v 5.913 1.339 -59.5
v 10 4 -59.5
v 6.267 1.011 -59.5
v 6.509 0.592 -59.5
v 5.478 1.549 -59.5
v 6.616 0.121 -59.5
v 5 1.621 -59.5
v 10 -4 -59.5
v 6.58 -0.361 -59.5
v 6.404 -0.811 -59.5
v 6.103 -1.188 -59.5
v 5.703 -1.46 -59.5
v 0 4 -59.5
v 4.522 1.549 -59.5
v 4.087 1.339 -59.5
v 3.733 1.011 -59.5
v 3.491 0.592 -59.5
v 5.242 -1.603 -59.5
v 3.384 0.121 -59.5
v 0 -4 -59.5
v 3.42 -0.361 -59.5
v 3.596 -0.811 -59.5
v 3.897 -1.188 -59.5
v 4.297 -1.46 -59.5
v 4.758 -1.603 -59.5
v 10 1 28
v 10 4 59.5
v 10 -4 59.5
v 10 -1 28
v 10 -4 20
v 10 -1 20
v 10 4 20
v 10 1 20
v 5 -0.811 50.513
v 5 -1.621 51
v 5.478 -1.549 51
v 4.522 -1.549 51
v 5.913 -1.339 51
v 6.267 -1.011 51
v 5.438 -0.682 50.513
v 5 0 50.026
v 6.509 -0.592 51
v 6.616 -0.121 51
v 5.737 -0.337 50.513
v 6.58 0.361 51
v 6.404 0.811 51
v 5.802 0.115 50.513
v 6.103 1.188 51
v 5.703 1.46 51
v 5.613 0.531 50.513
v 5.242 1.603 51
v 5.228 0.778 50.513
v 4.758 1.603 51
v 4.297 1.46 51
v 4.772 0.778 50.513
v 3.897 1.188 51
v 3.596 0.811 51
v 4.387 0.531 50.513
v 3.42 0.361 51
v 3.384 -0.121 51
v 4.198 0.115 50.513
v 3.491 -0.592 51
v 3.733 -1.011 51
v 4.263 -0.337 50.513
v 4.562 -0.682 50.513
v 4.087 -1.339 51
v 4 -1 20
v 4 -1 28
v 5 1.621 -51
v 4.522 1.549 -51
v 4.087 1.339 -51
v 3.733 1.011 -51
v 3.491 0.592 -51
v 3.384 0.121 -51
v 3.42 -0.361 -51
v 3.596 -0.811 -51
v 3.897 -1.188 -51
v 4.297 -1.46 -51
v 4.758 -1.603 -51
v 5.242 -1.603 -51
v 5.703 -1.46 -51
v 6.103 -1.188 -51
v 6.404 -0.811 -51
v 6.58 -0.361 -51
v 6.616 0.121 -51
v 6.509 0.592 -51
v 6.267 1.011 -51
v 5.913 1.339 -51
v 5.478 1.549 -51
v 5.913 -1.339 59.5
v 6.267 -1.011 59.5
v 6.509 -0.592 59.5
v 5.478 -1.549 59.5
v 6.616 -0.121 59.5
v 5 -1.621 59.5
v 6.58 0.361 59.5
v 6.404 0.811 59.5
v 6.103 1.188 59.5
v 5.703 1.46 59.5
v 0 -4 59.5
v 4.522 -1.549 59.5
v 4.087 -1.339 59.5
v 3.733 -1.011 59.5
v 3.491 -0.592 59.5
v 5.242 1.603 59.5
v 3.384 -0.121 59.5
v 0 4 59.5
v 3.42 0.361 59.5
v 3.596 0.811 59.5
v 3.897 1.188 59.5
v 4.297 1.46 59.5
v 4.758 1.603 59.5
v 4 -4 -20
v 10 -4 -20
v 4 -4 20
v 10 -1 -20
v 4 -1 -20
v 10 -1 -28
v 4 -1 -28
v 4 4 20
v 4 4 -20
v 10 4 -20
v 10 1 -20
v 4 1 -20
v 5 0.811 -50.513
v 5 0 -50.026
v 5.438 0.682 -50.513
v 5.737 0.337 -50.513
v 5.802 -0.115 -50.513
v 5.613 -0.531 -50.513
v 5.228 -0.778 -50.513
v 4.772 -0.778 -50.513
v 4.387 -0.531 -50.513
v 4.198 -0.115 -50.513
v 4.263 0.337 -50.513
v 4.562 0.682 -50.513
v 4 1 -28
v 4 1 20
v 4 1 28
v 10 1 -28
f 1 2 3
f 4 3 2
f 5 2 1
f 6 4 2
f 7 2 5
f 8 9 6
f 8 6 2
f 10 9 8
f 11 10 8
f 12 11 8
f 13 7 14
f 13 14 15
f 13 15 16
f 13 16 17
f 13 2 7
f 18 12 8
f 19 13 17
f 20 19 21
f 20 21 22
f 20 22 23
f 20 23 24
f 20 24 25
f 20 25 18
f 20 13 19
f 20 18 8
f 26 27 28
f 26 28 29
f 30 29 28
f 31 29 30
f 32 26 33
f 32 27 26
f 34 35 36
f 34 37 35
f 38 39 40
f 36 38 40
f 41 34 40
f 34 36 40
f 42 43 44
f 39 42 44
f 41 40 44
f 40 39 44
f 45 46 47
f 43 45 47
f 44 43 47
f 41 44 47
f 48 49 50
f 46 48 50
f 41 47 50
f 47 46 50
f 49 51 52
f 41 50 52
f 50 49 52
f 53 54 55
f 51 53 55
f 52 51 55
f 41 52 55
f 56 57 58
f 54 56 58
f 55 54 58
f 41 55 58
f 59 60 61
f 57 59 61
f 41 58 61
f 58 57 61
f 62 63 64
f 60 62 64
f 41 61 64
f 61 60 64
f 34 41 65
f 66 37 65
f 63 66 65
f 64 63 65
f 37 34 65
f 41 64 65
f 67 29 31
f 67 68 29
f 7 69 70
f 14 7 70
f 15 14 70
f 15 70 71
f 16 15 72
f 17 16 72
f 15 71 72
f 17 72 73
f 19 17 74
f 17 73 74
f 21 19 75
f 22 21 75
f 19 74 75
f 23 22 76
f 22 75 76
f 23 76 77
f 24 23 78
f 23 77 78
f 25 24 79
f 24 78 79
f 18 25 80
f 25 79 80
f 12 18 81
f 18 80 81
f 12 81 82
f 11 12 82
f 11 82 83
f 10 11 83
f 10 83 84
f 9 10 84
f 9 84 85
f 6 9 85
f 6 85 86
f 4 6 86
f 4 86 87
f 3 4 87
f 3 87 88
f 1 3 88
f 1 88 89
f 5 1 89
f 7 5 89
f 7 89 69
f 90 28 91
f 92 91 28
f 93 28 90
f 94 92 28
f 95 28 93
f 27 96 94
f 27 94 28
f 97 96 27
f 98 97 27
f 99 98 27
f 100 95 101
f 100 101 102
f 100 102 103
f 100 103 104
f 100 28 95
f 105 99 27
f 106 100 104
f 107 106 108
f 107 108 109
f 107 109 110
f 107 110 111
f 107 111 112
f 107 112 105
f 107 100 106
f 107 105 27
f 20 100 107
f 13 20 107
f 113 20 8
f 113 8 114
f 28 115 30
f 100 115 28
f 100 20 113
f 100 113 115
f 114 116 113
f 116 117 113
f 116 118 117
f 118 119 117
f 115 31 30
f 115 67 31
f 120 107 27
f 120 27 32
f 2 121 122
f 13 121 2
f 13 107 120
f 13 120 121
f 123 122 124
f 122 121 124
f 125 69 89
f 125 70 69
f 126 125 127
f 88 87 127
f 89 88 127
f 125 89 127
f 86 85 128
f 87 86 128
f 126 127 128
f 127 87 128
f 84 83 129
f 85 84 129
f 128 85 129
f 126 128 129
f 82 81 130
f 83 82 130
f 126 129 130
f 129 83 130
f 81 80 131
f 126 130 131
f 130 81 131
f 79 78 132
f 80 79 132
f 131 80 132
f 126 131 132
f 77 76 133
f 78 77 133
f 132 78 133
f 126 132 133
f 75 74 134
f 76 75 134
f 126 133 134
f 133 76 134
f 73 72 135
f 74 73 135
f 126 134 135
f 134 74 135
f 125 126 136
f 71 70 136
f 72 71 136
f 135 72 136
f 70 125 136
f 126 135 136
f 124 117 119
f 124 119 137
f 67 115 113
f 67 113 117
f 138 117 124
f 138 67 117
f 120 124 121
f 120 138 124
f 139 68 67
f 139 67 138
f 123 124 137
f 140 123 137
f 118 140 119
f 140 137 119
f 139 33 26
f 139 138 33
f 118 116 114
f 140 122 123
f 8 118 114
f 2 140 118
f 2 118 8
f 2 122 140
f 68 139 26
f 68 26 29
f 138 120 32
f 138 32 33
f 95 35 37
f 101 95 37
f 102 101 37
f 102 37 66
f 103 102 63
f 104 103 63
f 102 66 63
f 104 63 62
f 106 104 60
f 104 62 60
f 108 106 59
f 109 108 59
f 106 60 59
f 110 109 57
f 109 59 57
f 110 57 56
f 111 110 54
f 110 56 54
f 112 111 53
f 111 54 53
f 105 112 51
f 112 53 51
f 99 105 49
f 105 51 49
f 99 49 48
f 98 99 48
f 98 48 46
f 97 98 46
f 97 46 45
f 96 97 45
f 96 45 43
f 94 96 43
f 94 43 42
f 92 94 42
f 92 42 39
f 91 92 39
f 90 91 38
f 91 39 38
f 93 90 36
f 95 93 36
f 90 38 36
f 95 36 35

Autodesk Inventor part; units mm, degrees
ref_plane "YZ Plane" through (0, 0, 0) normal (1, 0, 0) x (0, 1, 0)
ref_plane "XZ Plane" through (0, 0, 0) normal (0, 1, 0) x (-1, 0, 0)
ref_plane "XY Plane" through (0, 0, 0) normal (0, 0, 1) x (1, 0, 0)
sketch "Sketch3" plane through (0, 0, 0) normal (1, 0, 0) x (0, 1, 0)
  line L0 (-4, 59.5) -> (4, 59.5)
  line L1 (4, 59.5) -> (4, -59.5)
  line L2 (4, -59.5) -> (-4, -59.5)
  line L3 (-4, -59.5) -> (-4, 59.5)
  line L4 (-67.3512, -62.0209) -> (6.0524, -62.0209) projected
  line L5 (-86.0704, 69.3717) -> (-9.6617, 69.3717)
  line L6 (-9.4707, -54.67) -> (-85.8794, -54.67)
  point P0 (0, 0)
  dimension "d7" = 119
  dimension "d8" = 59.5
  dimension "d9" = 8
  dimension "d10" = 4
  dimension "d50" = 124.0417
extrude "Extrusion1" add sketch "Sketch3" along normal blind 4
sketch "Sketch4" plane through (4, 0, 0) normal (1, 0, 0) x (0, 0, -1)
  line L0 (-59.5, 4) -> (59.5, 4) projected
  line L1 (-59.5, -4) -> (-59.5, 4) projected
  line L2 (59.5, -4) -> (-59.5, -4) projected
  line L3 (59.5, 4) -> (59.5, -4) projected
  line L4 (-59.5, 4) -> (-20, 4)
  line L5 (-20, -4) -> (-59.5, -4)
  line L6 (-59.5, -4) -> (-59.5, 4)
  line L7 (59.5, 4) -> (59.5, -4)
  line L8 (-20, 4) -> (-20, 1)
  line L9 (-20, 1) -> (-28, 1)
  line L10 (-28, 1) -> (-28, -1)
  line L11 (-28, -1) -> (-20, -1)
  line L12 (-20, -1) -> (-20, -4)
  line L13 (0, -4) -> (0, 4)
  line L14 (59.5, 4) -> (20, 4)
  line L15 (20, 1) -> (28, 1)
  line L16 (28, 1) -> (28, -1)
  line L17 (28, -1) -> (20, -1)
  line L18 (20, -1) -> (20, -4)
  line L19 (20, 4) -> (20, 1)
  line L20 (20, -4) -> (59.5, -4)
  point P0 (0, 0)
  dimension "d20" = 28
  dimension "d21" = 2
  dimension "d22" = 1
  dimension "d23" = 20
  dimension "d24" = 20
  dimension "d25" = 20
  dimension "d26" = 20
  dimension "d27" = 1
  dimension "d28" = 1
  dimension "d29" = 28
extrude "Extrusion3" add sketch "Sketch4" along normal blind 6 contours L0 L8 L9 L10 L11 L12 L2 L1 | L0 L3 L2 L18 L17 L16 L15 L19
sketch "Sketch6" plane through (0, -4, 59.5) normal (0, 0, 1) x (1, 0, 0)
  line L0 (0, 8) -> (10, 8) projected
  line L1 (0, 0) -> (0, 8) projected
  point P0 (0, 4)
  point P1 (5, 4)
  dimension "d32" = 4
  dimension "d33" = 5
hole "Hole1" at (5, 0, 59.5) direction (0, 0, -1) diameter 3.242 depth 8.5 tip angle 118 thread size "M4x0.7" class "6H" standard "ISO Metric profile"
sketch "Sketch7" plane through (0, -4, -59.5) normal (0, 0, -1) x (-1, 0, 0)
  line L0 (0, 0) -> (-10, 0) projected
  line L1 (0, 8) -> (0, 0) projected
  point P0 (0, 4)
  point P1 (-5, 4)
  dimension "d41" = 5
  dimension "d42" = 4
hole "Hole2" at (5, 0, -59.5) direction (0, 0, 1) diameter 3.242 depth 8.5 tip angle 118 thread size "M4x0.7" class "6H" standard "ISO Metric profile"
equation "\"d8\" = 0.5 * d7"
equation "\"d10\" = 0.5 * d9"
equation "\"d22\" = 0.5 * d21"
equation "\"d24\" = d23"
equation "\"d25\" = d23"
equation "\"d26\" = d23"
equation "\"d27\" = 0.5 * d21"
equation "\"d28\" = 0.5 * d21"
equation "\"d29\" = d20"
equation "\"d32\" = 0.5 * d9"
equation "\"d33\" = 0.5 * d30 + 0.5 * d11"
equation "\"d41\" = 0.5 * d30 + 0.5 * d11"
equation "\"d42\" = 0.5 * d9"
equation "\"d30\" = 6"
equation "\"d11\" = 4"
properties part number "feet"
